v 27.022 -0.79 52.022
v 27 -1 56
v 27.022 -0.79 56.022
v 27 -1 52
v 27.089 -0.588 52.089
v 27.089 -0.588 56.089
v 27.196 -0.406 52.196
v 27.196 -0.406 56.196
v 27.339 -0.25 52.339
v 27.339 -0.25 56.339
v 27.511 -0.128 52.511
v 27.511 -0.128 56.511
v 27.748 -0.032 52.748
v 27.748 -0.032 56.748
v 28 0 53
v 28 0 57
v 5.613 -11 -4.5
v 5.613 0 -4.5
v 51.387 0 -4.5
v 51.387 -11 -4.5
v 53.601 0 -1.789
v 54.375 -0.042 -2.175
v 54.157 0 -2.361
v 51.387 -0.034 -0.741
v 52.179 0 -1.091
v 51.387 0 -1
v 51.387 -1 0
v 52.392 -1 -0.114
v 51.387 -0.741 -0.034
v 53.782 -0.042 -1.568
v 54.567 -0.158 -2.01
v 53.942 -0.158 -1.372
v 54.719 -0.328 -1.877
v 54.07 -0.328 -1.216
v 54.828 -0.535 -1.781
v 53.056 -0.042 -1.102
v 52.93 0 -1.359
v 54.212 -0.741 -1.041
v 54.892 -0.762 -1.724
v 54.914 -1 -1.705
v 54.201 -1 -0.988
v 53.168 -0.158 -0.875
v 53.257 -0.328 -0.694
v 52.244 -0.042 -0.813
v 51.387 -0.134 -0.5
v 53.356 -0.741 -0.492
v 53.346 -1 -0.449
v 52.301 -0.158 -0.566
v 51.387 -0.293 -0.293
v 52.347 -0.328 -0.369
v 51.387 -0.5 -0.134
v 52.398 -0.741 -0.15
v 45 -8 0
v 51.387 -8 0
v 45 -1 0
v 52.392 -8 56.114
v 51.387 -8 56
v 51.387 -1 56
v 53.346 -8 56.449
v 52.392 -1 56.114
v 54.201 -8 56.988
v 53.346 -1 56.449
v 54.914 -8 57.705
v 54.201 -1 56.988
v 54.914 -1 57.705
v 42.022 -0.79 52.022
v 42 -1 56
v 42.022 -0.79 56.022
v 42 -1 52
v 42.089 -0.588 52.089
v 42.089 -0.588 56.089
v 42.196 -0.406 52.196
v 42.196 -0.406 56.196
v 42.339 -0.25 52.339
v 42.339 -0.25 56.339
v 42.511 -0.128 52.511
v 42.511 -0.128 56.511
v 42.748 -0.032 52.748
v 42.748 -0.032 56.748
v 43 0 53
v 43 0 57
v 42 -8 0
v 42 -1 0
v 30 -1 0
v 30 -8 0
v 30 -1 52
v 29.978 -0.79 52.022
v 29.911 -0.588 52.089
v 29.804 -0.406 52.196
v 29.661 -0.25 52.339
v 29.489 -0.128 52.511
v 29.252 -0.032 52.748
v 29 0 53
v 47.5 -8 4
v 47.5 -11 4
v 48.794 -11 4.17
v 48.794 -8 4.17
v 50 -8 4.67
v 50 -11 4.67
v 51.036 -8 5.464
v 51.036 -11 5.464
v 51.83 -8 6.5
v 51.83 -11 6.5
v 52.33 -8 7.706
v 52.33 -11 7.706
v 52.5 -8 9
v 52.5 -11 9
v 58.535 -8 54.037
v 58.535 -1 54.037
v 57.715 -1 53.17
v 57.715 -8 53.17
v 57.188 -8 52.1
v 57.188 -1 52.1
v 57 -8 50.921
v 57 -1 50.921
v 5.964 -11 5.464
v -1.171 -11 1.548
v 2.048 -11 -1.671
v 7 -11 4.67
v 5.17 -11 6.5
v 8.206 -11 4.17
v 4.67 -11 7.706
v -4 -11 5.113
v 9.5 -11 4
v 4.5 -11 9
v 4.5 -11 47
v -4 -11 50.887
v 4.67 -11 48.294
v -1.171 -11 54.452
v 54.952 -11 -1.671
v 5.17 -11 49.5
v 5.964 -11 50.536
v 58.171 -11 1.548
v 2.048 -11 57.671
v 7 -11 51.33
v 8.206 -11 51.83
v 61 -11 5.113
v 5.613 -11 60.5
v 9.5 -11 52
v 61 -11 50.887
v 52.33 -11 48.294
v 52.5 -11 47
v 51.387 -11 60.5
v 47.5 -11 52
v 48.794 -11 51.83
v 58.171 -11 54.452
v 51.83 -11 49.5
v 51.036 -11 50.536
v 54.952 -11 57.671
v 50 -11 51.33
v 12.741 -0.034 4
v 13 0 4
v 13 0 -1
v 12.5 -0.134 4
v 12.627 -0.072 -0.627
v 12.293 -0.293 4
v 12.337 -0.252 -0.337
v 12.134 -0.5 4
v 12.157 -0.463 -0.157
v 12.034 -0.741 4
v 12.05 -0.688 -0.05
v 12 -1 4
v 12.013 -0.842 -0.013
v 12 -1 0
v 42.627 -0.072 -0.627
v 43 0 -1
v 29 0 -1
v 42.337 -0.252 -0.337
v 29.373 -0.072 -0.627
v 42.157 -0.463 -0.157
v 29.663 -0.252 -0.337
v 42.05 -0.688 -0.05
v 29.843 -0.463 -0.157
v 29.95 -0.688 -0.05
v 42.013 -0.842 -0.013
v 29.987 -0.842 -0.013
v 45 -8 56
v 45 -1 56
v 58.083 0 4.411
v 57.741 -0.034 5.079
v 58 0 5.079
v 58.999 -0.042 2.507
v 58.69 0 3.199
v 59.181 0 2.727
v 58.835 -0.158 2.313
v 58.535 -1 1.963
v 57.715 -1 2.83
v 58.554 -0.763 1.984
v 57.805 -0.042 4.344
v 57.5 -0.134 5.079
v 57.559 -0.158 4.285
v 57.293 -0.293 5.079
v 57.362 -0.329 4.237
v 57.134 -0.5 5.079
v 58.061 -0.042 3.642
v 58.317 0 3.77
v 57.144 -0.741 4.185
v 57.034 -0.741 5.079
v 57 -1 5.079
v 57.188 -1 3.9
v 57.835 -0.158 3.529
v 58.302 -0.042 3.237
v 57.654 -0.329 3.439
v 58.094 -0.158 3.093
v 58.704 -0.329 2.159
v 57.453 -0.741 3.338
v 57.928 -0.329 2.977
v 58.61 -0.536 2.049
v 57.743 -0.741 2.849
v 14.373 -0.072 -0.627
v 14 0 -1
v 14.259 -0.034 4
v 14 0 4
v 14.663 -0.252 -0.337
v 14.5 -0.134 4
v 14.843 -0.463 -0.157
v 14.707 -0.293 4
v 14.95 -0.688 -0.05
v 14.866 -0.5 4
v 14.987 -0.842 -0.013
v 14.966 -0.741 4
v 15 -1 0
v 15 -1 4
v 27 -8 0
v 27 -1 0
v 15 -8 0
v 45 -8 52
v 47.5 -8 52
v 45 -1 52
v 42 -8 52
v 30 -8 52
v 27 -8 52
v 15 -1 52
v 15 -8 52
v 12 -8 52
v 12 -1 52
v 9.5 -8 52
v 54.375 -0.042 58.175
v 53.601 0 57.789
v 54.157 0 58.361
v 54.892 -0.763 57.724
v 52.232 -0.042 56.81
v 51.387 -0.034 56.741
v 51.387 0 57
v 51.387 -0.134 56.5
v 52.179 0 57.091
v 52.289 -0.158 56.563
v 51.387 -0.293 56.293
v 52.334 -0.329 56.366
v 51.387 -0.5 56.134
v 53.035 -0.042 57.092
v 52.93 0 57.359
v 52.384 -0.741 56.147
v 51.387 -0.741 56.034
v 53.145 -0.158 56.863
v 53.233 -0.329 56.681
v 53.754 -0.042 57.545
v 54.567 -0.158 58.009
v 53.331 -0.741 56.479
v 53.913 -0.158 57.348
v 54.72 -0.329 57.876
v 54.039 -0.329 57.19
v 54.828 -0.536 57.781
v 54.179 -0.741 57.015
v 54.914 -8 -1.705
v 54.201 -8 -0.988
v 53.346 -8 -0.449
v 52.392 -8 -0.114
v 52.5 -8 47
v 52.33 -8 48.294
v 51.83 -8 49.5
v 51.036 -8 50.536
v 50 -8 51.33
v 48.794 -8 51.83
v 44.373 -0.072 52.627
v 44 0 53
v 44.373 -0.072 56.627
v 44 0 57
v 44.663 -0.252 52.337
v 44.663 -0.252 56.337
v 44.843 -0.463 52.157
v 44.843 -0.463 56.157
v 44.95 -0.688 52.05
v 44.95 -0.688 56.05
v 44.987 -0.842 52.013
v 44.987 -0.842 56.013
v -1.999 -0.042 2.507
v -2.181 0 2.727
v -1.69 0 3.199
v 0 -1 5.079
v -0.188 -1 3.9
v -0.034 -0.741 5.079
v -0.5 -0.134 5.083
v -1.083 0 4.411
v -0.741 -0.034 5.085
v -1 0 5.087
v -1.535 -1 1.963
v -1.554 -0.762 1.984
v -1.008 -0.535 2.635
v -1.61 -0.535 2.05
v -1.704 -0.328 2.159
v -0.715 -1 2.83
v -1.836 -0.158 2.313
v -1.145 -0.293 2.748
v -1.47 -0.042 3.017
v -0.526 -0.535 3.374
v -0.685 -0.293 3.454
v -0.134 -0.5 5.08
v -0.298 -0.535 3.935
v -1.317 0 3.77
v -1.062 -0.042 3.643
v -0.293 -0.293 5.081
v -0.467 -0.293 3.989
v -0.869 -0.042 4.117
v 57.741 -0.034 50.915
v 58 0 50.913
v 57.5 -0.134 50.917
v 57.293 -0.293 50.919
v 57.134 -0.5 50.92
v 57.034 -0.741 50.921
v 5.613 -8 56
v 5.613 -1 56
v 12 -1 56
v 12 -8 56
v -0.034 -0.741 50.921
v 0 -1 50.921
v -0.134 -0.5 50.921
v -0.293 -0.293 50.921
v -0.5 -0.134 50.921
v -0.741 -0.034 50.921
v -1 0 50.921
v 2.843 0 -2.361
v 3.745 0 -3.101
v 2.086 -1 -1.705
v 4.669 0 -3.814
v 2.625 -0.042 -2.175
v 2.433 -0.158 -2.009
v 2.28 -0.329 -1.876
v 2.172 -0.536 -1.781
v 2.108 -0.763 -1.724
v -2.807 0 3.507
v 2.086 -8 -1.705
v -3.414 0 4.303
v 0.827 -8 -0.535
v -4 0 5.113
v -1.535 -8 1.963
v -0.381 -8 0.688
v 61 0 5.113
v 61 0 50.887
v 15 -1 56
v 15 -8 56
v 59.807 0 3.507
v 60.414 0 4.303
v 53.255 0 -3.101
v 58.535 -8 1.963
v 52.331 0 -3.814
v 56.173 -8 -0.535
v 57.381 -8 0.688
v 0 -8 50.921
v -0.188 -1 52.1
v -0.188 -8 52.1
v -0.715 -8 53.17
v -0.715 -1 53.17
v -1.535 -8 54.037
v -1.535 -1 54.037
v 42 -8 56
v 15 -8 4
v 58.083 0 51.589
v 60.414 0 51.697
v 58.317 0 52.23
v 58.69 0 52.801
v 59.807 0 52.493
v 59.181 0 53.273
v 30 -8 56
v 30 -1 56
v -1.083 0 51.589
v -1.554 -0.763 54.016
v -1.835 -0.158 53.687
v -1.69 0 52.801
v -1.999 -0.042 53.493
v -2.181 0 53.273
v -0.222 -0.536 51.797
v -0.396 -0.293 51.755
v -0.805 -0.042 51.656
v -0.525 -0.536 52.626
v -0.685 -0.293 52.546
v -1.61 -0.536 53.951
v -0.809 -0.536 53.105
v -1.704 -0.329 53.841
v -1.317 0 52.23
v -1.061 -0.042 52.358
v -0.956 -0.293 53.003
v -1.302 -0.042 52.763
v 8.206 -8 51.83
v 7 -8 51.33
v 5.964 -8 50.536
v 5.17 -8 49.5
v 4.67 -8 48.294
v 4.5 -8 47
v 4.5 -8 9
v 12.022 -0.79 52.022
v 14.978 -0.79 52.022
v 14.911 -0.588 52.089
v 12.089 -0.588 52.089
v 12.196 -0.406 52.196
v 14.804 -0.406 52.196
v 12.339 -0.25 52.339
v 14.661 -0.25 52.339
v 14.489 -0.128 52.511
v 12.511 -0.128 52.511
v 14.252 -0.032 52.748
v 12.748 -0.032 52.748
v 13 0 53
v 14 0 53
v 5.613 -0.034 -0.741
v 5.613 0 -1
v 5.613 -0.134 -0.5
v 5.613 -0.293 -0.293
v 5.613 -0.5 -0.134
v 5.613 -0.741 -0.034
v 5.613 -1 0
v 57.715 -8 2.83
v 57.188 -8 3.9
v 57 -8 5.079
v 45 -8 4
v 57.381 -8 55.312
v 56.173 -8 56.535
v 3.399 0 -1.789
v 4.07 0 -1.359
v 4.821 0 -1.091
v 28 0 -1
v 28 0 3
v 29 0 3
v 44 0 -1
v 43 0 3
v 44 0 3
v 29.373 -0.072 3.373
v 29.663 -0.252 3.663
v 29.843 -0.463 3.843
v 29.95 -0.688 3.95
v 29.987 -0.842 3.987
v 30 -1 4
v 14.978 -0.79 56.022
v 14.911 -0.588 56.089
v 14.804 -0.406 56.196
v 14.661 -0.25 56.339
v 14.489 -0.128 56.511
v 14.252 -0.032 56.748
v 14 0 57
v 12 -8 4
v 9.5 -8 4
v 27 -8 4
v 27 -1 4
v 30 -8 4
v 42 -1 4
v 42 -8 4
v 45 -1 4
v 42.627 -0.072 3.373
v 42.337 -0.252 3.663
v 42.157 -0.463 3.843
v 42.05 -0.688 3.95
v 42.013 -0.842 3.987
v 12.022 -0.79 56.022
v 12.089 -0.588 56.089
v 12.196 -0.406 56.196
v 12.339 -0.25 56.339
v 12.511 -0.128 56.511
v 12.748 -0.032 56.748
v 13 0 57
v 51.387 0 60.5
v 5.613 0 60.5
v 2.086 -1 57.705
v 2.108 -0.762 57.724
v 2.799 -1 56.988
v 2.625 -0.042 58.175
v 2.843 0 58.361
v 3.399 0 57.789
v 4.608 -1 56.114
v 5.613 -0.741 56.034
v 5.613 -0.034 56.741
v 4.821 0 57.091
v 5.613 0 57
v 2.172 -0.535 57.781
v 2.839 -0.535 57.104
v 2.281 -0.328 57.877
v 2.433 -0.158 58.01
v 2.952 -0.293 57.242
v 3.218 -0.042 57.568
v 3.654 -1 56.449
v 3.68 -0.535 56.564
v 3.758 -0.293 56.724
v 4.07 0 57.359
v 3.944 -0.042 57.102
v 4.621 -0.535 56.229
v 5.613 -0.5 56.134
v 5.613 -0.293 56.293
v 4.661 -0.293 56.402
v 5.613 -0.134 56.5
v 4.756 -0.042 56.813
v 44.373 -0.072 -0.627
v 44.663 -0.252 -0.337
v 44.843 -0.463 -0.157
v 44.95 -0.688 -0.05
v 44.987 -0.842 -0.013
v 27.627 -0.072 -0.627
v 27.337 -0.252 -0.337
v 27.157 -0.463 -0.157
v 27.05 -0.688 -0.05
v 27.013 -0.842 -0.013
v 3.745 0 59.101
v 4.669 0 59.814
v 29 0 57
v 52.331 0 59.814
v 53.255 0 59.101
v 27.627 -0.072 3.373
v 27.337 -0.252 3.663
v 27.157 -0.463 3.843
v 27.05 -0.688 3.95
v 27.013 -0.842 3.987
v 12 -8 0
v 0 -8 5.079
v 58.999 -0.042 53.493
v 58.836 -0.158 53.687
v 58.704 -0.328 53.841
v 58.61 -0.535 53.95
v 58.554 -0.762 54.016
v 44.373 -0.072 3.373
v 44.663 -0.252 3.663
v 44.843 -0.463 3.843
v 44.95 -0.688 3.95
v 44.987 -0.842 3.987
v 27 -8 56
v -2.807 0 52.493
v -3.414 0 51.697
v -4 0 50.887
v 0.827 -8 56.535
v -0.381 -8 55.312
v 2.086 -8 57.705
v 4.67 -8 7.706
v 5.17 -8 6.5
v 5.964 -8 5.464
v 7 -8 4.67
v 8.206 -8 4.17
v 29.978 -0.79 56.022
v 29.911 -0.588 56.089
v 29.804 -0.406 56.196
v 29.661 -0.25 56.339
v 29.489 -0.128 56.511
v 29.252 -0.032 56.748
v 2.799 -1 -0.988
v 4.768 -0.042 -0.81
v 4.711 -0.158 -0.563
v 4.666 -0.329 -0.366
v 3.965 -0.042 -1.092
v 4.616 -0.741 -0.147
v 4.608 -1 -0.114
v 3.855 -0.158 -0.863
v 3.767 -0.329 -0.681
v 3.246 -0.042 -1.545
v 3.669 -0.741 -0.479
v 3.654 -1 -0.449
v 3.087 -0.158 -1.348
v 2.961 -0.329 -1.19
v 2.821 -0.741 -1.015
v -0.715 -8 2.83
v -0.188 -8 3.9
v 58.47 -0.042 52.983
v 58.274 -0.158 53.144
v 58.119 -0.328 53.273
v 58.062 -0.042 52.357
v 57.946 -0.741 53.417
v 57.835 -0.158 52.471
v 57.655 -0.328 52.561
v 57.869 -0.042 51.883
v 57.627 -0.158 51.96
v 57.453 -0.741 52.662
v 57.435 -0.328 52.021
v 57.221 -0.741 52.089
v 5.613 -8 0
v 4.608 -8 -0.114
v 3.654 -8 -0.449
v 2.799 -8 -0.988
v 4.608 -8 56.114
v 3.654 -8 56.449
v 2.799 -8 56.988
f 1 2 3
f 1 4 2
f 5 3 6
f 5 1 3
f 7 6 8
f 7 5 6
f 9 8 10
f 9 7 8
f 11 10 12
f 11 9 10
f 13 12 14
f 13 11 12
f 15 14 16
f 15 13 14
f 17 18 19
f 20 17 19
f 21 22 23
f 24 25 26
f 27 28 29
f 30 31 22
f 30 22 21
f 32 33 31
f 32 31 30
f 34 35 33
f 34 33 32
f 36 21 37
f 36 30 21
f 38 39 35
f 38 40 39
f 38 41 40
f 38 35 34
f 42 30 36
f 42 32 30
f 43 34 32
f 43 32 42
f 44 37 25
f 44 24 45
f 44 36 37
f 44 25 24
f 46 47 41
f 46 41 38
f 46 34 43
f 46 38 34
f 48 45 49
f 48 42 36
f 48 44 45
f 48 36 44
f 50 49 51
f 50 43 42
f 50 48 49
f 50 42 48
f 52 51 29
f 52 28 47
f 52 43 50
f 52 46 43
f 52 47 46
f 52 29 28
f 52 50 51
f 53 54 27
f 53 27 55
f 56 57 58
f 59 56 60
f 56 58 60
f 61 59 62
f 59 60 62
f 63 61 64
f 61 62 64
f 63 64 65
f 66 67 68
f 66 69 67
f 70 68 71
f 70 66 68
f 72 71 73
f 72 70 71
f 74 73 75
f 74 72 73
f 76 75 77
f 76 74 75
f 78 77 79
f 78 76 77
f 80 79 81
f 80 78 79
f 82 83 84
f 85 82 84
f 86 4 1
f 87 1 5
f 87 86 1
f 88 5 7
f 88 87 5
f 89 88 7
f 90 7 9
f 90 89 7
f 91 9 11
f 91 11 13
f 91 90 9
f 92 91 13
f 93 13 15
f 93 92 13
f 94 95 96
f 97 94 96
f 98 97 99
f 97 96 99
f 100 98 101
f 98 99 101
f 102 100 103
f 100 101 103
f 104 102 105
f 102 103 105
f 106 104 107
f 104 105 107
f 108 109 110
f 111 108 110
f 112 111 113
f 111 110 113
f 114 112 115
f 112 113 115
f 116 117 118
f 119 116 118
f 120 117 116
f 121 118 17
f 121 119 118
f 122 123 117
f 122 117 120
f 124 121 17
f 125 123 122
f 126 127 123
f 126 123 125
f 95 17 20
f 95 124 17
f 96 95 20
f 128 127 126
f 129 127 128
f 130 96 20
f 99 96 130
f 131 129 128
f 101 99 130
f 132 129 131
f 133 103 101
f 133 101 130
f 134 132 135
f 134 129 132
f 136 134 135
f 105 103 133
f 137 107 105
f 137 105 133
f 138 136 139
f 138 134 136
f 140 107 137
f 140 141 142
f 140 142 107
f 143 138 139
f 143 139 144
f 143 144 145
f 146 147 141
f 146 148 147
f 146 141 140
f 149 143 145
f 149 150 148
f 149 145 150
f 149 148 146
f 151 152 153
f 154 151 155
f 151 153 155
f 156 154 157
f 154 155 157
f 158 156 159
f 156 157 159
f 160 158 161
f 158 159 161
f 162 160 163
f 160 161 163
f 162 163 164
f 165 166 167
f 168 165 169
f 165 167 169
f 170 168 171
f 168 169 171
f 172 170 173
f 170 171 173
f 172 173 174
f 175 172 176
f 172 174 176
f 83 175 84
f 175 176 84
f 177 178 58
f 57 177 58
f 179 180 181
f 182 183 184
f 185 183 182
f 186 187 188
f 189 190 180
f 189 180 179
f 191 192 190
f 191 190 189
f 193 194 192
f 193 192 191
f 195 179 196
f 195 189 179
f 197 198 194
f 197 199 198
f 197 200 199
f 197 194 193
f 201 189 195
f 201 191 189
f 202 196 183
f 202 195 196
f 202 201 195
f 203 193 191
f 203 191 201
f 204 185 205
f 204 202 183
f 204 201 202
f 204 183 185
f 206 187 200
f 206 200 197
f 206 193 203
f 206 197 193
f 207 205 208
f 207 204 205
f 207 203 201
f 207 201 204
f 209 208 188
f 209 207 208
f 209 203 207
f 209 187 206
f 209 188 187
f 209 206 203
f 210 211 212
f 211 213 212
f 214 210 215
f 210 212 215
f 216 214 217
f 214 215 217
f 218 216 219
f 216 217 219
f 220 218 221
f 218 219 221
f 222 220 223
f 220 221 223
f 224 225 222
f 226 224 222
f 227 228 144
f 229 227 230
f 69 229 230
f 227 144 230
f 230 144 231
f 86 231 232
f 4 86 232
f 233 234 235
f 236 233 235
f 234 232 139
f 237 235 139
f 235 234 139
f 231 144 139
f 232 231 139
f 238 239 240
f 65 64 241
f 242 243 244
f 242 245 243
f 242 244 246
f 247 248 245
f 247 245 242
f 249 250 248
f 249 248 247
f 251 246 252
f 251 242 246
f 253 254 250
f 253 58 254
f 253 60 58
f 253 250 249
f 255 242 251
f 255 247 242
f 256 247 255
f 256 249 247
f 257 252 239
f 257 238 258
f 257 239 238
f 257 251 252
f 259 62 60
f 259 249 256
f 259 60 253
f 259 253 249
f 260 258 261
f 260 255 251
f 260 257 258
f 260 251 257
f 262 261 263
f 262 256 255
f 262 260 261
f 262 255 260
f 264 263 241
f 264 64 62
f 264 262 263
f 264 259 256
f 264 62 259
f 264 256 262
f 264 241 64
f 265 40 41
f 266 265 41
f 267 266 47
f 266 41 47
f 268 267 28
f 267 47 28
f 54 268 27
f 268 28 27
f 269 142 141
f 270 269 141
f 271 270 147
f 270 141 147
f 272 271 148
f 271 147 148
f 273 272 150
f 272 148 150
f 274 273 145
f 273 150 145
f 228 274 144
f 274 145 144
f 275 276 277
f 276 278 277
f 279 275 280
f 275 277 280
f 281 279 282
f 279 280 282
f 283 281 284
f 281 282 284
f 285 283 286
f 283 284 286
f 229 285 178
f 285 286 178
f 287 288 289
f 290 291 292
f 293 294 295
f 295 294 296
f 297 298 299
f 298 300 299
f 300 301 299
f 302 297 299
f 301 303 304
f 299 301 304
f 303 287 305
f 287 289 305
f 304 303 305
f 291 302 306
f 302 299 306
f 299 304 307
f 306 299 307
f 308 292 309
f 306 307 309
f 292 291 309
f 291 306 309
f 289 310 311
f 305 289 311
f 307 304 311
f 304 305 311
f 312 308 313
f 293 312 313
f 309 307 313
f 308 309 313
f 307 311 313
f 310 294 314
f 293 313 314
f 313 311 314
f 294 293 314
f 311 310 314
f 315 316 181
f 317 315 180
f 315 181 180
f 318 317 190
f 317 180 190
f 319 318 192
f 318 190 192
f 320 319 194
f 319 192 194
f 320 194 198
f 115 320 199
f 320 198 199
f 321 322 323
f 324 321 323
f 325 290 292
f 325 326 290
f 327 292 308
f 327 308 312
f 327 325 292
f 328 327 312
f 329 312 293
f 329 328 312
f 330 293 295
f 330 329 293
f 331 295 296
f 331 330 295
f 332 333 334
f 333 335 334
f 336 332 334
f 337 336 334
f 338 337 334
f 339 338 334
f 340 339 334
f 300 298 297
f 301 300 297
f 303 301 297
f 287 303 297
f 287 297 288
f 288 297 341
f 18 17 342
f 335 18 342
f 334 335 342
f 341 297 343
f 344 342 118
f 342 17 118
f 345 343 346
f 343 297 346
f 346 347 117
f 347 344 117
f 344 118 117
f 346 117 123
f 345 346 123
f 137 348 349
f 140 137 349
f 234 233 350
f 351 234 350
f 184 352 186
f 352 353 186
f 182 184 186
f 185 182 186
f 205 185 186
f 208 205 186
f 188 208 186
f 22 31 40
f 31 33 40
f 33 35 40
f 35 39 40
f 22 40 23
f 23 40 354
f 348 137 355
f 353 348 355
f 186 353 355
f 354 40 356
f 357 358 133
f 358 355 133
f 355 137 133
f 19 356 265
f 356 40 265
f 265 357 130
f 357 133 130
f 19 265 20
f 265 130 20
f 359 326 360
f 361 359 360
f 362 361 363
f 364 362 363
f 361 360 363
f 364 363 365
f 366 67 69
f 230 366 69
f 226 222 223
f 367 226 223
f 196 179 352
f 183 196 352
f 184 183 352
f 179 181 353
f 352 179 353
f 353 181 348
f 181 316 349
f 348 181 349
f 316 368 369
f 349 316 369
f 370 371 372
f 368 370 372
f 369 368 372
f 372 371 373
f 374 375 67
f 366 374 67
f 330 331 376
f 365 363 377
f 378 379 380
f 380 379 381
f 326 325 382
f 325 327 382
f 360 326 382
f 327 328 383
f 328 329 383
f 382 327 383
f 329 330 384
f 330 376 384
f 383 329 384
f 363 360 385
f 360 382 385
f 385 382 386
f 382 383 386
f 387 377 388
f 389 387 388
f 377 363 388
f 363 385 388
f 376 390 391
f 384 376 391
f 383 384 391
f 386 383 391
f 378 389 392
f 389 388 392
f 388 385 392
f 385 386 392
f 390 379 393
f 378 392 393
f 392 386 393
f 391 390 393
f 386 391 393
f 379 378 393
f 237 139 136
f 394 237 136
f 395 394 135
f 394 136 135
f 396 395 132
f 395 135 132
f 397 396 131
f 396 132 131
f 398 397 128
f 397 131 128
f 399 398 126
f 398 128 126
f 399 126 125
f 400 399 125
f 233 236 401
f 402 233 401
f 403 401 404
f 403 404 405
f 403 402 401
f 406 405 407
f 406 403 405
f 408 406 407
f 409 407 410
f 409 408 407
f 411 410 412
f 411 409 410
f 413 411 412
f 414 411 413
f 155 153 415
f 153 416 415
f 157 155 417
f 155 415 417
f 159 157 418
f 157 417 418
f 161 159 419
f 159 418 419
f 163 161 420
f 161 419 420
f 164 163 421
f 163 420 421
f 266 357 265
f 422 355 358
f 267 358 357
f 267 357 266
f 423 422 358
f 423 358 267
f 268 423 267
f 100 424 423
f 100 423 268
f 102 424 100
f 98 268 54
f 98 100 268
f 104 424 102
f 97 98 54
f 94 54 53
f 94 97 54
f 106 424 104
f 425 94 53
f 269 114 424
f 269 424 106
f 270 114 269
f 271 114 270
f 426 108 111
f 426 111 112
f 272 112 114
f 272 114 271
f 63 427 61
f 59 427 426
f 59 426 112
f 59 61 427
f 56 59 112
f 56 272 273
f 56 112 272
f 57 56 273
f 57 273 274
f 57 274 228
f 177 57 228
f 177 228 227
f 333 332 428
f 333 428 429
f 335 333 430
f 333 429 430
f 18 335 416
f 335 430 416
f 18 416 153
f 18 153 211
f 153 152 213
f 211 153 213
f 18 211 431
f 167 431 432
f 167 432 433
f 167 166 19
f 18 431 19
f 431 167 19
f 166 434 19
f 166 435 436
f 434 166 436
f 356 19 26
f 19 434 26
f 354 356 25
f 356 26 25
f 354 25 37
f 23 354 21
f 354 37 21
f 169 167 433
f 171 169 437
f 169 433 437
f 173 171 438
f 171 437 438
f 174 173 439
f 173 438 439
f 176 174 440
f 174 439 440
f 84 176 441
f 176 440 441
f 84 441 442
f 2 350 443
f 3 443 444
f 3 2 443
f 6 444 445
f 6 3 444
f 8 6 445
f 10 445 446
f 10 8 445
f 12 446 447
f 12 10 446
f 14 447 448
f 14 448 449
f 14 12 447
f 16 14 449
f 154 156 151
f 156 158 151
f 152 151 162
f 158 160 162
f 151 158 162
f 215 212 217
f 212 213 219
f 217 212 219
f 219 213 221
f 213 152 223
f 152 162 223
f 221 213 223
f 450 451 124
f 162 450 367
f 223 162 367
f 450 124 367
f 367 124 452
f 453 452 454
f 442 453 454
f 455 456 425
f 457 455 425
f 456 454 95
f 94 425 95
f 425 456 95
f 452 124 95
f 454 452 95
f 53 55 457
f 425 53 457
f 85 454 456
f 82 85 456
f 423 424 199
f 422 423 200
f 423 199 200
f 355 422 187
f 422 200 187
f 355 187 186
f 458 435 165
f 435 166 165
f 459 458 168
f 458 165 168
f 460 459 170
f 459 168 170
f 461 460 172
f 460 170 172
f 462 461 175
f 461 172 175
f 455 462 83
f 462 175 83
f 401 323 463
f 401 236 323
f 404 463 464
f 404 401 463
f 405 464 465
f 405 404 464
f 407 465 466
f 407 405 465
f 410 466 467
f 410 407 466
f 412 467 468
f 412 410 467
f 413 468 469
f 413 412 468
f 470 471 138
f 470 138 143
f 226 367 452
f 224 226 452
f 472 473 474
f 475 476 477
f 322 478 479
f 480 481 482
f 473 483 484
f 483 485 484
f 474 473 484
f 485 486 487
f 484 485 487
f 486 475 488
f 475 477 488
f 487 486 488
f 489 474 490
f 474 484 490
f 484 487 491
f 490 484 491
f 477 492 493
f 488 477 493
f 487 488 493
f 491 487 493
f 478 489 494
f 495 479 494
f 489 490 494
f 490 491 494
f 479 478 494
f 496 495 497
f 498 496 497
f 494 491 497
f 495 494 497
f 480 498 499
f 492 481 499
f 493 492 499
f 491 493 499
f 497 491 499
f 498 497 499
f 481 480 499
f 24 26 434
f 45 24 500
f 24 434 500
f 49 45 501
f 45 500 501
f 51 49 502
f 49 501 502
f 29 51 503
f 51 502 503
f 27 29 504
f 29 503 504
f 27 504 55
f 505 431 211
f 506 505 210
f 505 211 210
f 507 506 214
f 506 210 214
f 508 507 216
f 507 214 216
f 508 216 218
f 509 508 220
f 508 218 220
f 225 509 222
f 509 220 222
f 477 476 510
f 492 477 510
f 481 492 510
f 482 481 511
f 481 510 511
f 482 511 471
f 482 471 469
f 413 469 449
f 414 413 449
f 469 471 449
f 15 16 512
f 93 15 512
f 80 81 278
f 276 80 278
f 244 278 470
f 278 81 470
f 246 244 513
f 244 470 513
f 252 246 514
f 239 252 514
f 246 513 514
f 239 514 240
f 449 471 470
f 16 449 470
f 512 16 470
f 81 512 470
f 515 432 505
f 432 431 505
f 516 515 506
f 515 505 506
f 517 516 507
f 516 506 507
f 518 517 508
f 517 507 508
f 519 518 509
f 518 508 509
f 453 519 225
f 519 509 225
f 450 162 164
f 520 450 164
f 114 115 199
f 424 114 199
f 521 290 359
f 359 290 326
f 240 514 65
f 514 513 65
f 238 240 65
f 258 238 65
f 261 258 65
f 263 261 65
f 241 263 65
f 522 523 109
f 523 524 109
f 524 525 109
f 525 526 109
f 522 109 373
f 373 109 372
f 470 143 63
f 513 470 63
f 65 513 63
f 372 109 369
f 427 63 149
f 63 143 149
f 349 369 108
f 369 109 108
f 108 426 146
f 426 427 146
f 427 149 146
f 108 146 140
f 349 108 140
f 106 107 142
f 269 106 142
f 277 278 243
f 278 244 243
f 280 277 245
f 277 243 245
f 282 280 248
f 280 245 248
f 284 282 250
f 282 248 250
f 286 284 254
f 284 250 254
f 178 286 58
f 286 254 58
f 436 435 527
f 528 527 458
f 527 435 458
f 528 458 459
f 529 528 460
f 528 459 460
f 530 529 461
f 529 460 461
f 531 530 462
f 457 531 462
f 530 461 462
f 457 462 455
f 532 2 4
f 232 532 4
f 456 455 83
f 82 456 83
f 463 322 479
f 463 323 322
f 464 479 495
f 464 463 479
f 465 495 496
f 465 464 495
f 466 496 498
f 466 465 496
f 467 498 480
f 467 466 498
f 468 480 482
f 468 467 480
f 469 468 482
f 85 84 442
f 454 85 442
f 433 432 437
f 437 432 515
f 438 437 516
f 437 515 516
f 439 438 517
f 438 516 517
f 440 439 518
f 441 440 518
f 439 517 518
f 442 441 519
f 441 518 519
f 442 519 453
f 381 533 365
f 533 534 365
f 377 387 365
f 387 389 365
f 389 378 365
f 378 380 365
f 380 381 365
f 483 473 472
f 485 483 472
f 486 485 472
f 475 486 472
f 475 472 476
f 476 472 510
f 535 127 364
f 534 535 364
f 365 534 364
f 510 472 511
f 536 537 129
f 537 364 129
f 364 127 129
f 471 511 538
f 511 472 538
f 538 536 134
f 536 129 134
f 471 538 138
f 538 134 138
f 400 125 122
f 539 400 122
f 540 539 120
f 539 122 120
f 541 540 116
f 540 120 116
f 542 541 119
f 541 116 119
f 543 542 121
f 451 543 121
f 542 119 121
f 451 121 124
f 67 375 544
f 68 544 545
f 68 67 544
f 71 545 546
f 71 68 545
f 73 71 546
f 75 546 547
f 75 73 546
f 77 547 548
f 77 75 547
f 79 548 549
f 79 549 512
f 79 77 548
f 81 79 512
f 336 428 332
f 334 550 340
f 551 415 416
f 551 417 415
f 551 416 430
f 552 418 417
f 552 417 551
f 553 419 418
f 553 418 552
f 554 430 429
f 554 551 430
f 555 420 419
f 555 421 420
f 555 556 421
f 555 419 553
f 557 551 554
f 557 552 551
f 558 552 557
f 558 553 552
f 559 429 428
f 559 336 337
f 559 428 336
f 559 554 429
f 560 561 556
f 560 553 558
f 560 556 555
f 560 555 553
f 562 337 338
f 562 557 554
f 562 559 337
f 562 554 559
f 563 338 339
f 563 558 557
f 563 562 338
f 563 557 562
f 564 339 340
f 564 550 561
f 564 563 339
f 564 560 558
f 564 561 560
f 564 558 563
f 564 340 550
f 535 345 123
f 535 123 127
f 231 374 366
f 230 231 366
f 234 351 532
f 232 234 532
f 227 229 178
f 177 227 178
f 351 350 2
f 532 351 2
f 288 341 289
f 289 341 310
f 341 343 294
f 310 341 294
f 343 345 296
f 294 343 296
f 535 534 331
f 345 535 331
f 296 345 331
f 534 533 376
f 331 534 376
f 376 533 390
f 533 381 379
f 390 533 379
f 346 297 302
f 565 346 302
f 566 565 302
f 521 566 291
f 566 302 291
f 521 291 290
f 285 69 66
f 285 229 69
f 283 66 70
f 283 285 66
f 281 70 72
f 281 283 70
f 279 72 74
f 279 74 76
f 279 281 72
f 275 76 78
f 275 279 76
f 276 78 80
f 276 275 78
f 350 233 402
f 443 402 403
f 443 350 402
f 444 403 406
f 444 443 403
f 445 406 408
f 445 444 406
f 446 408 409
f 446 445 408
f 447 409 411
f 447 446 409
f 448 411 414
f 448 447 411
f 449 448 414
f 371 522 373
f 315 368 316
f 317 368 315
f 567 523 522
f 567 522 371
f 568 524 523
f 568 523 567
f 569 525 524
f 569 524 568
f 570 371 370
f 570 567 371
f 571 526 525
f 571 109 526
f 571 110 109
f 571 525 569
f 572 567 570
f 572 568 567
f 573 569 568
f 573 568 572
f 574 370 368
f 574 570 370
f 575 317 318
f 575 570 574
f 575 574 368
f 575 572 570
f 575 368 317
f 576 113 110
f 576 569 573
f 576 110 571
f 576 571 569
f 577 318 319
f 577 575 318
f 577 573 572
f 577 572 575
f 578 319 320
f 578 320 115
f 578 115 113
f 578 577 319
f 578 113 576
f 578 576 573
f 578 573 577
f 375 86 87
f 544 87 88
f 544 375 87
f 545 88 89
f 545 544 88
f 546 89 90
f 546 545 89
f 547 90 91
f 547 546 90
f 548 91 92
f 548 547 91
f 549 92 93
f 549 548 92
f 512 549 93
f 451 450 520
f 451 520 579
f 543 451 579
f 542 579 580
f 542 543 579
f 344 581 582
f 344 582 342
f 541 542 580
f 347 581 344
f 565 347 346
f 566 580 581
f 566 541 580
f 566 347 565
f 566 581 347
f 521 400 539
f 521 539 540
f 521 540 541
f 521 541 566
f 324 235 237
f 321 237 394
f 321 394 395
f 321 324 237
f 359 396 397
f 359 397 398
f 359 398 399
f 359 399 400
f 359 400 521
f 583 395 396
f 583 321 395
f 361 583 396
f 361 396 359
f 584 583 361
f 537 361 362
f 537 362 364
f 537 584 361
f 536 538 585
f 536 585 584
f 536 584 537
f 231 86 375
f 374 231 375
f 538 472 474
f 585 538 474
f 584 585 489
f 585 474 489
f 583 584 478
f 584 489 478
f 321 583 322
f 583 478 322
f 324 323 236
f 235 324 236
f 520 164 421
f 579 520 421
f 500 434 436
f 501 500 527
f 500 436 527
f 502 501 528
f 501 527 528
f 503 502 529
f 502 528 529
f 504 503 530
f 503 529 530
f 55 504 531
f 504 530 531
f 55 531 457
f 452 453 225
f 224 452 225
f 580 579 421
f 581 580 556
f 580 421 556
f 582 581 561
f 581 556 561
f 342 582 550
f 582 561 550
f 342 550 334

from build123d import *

# Parameters (mm, degrees)
F0_W     = 65
F0_H     = 65
F1_DEPTH = 8
F2_W     = 65
F2_H     = 65
F3_DEPTH = 3
F5_DEPTH = 11.001
F7_DEPTH = 11.001
F9_DEPTH = 8
F10_R    = 1


with BuildPart() as f1:
    # F0 (on Front) → F1 (new body)
    with BuildSketch(Plane.XZ):
        with Locations((28.5, 28)):
            Rectangle(F0_W, F0_H)
        Polygon((12, 0), (0, 0), (0, 56), (12, 56), (12, 52), (15, 52), (15, 56), (27, 56), (27, 52), (30, 52), (30, 56), (42, 56), (42, 52), (45, 52), (45, 56), (57, 56), (57, 0), (45, 0), (45, 4), (42, 4), (42, 0), (30, 0), (30, 4), (27, 4), (27, 0), (15, 0), (15, 4), (12, 4), align=None, mode=Mode.SUBTRACT)
    extrude(amount=F1_DEPTH)

    # F2 (on face) → F3 (join)
    with BuildSketch(Plane.XZ.offset(8)):
        with Locations((28.5, 28)):
            Rectangle(F2_W, F2_H)
        Polygon((12, 4), (12, 0), (0, 0), (0, 56), (12, 56), (12, 52), (15, 52), (15, 56), (27, 56), (27, 52), (30, 52), (30, 56), (42, 56), (42, 52), (45, 52), (45, 56), (57, 56), (57, 0), (45, 0), (45, 4), (42, 4), (42, 0), (30, 0), (30, 4), (27, 4), (27, 0), (15, 0), (15, 4), align=None, mode=Mode.SUBTRACT)
        Polygon((0, 0), (12, 0), (12, 4), (15, 4), (15, 0), (27, 0), (27, 4), (30, 4), (30, 0), (42, 0), (42, 4), (45, 4), (45, 0), (57, 0), (57, 56), (45, 56), (45, 52), (42, 52), (42, 56), (30, 56), (30, 52), (27, 52), (27, 56), (15, 56), (15, 52), (12, 52), (12, 56), (0, 56), align=None)
    extrude(amount=F3_DEPTH)

    # F4 (on face) → F5 (cut, through all)
    with BuildSketch(Plane.XZ.offset(11)):
        with BuildLine():
            Line((9.5, 4), (47.5, 4))
            ThreePointArc((47.5, 4), (51.0355339059, 5.4644660941), (52.5, 9))
            Line((52.5, 9), (52.5, 47))
            ThreePointArc((52.5, 47), (51.0355339059, 50.5355339059), (47.5, 52))
            Line((47.5, 52), (9.5, 52))
            ThreePointArc((9.5, 52), (5.9644660941, 50.5355339059), (4.5, 47))
            Line((4.5, 47), (4.5, 9))
            ThreePointArc((4.5, 9), (5.9644660941, 5.4644660941), (9.5, 4))
        make_face()
    extrude(amount=-F5_DEPTH, mode=Mode.SUBTRACT)

    # F6 (on face) → F7 (cut, through all)
    with BuildSketch(Plane.XZ.offset(11)):
        with BuildLine():
            ThreePointArc((-4, 50.8869504303), (0.3925054478, 56.1074945522), (5.6130495697, 60.5))
            Line((5.6130495697, 60.5), (-4, 60.5))
            Line((-4, 60.5), (-4, 50.8869504303))
        make_face()
        with BuildLine():
            Line((61, 60.5), (51.3869504303, 60.5))
            ThreePointArc((51.3869504303, 60.5), (56.6074945522, 56.1074945522), (61, 50.8869504303))
            Line((61, 50.8869504303), (61, 60.5))
        make_face()
        with BuildLine():
            Line((61, -4.5), (61, 5.1130495697))
            ThreePointArc((61, 5.1130495697), (56.6074945522, -0.1074945522), (51.3869504303, -4.5))
            Line((51.3869504303, -4.5), (61, -4.5))
        make_face()
        with BuildLine():
            ThreePointArc((5.6130495697, -4.5), (0.3925054478, -0.1074945522), (-4, 5.1130495697))
            Line((-4, 5.1130495697), (-4, -4.5))
            Line((-4, -4.5), (5.6130495697, -4.5))
        make_face()
    extrude(amount=-F7_DEPTH, mode=Mode.SUBTRACT)

    # F8 (on face) → F9 (cut)
    with BuildSketch(Plane(origin=(0, 0, 0), x_dir=(-1, 0, 0), z_dir=(0, 1, 0))):
        with BuildLine():
            ThreePointArc((-54.9136378655, 57.7049193689), (-55.6366618004, 59.0201509297), (-55.8869504303, 60.5))
            Line((-55.8869504303, 60.5), (-61, 60.5))
            Line((-61, 60.5), (-62.4552159954, 54.6130084653))
            ThreePointArc((-62.4552159954, 54.6130084653), (-58.7438875569, 54.1901486861), (-56.9998547435, 50.8869504303))
            Line((-56.9998547435, 50.8869504303), (-51.3869504303, 50.8869504303))
            Line((-51.3869504303, 50.8869504303), (-51.3869504303, 56))
            Line((-51.3869504303, 56), (-56.7145795645, 56))
            ThreePointArc((-56.7145795645, 56), (-55.8274078977, 56.866507887), (-54.9136378655, 57.7049193689))
        make_face()
        with BuildLine():
            ThreePointArc((-51.3869504303, 56), (-53.3455388455, 56.4485889594), (-54.9136378655, 57.7049193689))
            ThreePointArc((-54.9136378655, 57.7049193689), (-55.8274078977, 56.866507887), (-56.7145795645, 56))
            Line((-56.7145795645, 56), (-51.3869504303, 56))
        make_face()
        with BuildLine():
            ThreePointArc((-0.2854204355, 56), (-1.1725921023, 56.866507887), (-2.0863621345, 57.7049193689))
            ThreePointArc((-2.0863621345, 57.7049193689), (-3.6544611545, 56.4485889594), (-5.6130495697, 56))
            Line((-5.6130495697, 56), (-0.2854204355, 56))
        make_face()
        with BuildLine():
            ThreePointArc((-1.1130495697, 60.5), (-1.3633381996, 59.0201509297), (-2.0863621345, 57.7049193689))
            ThreePointArc((-2.0863621345, 57.7049193689), (-1.1725921023, 56.866507887), (-0.2854204355, 56))
            Line((-0.2854204355, 56), (-5.6130495697, 56))
            Line((-5.6130495697, 56), (-5.6130495697, 50.8869504303))
            Line((-5.6130495697, 50.8869504303), (-0.0001452565, 50.8869504303))
            ThreePointArc((-0.0001452565, 50.8869504303), (1.7438875569, 54.1901486861), (5.4552159954, 54.6130084653))
            Line((5.4552159954, 54.6130084653), (4, 60.5))
            Line((4, 60.5), (-1.1130495697, 60.5))
        make_face()
        with BuildLine():
            Line((-5.6130495697, 5.1130495697), (-5.6130495697, 0))
            ThreePointArc((-5.6130495697, 0), (-2.4310690543, -1.3180194847), (-1.1130495697, -4.5))
            Line((-1.1130495697, -4.5), (4, -4.5))
            Line((4, -4.5), (5.4552159954, 1.3869915347))
            ThreePointArc((5.4552159954, 1.3869915347), (1.7438875569, 1.8098513139), (-0.0001452565, 5.1130495697))
            Line((-0.0001452565, 5.1130495697), (-5.6130495697, 5.1130495697))
        make_face()
        with BuildLine():
            ThreePointArc((-56.9998547435, 5.1130495697), (-58.7438875569, 1.8098513139), (-62.4552159954, 1.3869915347))
            Line((-62.4552159954, 1.3869915347), (-61, -4.5))
            Line((-61, -4.5), (-55.8869504303, -4.5))
            ThreePointArc((-55.8869504303, -4.5), (-54.5689309457, -1.3180194847), (-51.3869504303, 0))
            Line((-51.3869504303, 0), (-51.3869504303, 5.1130495697))
            Line((-51.3869504303, 5.1130495697), (-56.9998547435, 5.1130495697))
        make_face()
    extrude(amount=-F9_DEPTH, mode=Mode.SUBTRACT)

    # F10
    f10_edges = [f1.edges().sort_by_distance(p)[0] for p in [
        (48.193475, 0, 56),
        (45, 0, 54),
        (53.345539, 0, 56.448589),
        (43.5, 0, 52),
        (42, 0, 54),
        (36, 0, 56),
        (30, 0, 54),
        (28.5, 0, 52),
        (27, 0, 54),
        (21, 0, 56),
        (15, 0, 54),
        (13.5, 0, 52),
        (12, 0, 54),
        (8.806525, 0, 56),
        (57, 0, 28),
        (57.411614, 0, 52.654617),
        (57.411614, 0, 3.345383),
        (53.345539, 0, -0.448589),
        (48.193475, 0, 0),
        (45, 0, 2),
        (43.5, 0, 4),
        (42, 0, 2),
        (36, 0, 0),
        (30, 0, 2),
        (28.5, 0, 4),
        (27, 0, 2),
        (21, 0, 0),
        (15, 0, 2),
        (12, 0, 2),
        (8.806525, 0, 0),
        (0, 0, 28),
        (-0.411614, 0, 3.345383),
        (-0.411614, 0, 52.654617),
        (3.654461, 0, 56.448589),
    ]]
    fillet(f10_edges, radius=F10_R)


solid = f1.part
